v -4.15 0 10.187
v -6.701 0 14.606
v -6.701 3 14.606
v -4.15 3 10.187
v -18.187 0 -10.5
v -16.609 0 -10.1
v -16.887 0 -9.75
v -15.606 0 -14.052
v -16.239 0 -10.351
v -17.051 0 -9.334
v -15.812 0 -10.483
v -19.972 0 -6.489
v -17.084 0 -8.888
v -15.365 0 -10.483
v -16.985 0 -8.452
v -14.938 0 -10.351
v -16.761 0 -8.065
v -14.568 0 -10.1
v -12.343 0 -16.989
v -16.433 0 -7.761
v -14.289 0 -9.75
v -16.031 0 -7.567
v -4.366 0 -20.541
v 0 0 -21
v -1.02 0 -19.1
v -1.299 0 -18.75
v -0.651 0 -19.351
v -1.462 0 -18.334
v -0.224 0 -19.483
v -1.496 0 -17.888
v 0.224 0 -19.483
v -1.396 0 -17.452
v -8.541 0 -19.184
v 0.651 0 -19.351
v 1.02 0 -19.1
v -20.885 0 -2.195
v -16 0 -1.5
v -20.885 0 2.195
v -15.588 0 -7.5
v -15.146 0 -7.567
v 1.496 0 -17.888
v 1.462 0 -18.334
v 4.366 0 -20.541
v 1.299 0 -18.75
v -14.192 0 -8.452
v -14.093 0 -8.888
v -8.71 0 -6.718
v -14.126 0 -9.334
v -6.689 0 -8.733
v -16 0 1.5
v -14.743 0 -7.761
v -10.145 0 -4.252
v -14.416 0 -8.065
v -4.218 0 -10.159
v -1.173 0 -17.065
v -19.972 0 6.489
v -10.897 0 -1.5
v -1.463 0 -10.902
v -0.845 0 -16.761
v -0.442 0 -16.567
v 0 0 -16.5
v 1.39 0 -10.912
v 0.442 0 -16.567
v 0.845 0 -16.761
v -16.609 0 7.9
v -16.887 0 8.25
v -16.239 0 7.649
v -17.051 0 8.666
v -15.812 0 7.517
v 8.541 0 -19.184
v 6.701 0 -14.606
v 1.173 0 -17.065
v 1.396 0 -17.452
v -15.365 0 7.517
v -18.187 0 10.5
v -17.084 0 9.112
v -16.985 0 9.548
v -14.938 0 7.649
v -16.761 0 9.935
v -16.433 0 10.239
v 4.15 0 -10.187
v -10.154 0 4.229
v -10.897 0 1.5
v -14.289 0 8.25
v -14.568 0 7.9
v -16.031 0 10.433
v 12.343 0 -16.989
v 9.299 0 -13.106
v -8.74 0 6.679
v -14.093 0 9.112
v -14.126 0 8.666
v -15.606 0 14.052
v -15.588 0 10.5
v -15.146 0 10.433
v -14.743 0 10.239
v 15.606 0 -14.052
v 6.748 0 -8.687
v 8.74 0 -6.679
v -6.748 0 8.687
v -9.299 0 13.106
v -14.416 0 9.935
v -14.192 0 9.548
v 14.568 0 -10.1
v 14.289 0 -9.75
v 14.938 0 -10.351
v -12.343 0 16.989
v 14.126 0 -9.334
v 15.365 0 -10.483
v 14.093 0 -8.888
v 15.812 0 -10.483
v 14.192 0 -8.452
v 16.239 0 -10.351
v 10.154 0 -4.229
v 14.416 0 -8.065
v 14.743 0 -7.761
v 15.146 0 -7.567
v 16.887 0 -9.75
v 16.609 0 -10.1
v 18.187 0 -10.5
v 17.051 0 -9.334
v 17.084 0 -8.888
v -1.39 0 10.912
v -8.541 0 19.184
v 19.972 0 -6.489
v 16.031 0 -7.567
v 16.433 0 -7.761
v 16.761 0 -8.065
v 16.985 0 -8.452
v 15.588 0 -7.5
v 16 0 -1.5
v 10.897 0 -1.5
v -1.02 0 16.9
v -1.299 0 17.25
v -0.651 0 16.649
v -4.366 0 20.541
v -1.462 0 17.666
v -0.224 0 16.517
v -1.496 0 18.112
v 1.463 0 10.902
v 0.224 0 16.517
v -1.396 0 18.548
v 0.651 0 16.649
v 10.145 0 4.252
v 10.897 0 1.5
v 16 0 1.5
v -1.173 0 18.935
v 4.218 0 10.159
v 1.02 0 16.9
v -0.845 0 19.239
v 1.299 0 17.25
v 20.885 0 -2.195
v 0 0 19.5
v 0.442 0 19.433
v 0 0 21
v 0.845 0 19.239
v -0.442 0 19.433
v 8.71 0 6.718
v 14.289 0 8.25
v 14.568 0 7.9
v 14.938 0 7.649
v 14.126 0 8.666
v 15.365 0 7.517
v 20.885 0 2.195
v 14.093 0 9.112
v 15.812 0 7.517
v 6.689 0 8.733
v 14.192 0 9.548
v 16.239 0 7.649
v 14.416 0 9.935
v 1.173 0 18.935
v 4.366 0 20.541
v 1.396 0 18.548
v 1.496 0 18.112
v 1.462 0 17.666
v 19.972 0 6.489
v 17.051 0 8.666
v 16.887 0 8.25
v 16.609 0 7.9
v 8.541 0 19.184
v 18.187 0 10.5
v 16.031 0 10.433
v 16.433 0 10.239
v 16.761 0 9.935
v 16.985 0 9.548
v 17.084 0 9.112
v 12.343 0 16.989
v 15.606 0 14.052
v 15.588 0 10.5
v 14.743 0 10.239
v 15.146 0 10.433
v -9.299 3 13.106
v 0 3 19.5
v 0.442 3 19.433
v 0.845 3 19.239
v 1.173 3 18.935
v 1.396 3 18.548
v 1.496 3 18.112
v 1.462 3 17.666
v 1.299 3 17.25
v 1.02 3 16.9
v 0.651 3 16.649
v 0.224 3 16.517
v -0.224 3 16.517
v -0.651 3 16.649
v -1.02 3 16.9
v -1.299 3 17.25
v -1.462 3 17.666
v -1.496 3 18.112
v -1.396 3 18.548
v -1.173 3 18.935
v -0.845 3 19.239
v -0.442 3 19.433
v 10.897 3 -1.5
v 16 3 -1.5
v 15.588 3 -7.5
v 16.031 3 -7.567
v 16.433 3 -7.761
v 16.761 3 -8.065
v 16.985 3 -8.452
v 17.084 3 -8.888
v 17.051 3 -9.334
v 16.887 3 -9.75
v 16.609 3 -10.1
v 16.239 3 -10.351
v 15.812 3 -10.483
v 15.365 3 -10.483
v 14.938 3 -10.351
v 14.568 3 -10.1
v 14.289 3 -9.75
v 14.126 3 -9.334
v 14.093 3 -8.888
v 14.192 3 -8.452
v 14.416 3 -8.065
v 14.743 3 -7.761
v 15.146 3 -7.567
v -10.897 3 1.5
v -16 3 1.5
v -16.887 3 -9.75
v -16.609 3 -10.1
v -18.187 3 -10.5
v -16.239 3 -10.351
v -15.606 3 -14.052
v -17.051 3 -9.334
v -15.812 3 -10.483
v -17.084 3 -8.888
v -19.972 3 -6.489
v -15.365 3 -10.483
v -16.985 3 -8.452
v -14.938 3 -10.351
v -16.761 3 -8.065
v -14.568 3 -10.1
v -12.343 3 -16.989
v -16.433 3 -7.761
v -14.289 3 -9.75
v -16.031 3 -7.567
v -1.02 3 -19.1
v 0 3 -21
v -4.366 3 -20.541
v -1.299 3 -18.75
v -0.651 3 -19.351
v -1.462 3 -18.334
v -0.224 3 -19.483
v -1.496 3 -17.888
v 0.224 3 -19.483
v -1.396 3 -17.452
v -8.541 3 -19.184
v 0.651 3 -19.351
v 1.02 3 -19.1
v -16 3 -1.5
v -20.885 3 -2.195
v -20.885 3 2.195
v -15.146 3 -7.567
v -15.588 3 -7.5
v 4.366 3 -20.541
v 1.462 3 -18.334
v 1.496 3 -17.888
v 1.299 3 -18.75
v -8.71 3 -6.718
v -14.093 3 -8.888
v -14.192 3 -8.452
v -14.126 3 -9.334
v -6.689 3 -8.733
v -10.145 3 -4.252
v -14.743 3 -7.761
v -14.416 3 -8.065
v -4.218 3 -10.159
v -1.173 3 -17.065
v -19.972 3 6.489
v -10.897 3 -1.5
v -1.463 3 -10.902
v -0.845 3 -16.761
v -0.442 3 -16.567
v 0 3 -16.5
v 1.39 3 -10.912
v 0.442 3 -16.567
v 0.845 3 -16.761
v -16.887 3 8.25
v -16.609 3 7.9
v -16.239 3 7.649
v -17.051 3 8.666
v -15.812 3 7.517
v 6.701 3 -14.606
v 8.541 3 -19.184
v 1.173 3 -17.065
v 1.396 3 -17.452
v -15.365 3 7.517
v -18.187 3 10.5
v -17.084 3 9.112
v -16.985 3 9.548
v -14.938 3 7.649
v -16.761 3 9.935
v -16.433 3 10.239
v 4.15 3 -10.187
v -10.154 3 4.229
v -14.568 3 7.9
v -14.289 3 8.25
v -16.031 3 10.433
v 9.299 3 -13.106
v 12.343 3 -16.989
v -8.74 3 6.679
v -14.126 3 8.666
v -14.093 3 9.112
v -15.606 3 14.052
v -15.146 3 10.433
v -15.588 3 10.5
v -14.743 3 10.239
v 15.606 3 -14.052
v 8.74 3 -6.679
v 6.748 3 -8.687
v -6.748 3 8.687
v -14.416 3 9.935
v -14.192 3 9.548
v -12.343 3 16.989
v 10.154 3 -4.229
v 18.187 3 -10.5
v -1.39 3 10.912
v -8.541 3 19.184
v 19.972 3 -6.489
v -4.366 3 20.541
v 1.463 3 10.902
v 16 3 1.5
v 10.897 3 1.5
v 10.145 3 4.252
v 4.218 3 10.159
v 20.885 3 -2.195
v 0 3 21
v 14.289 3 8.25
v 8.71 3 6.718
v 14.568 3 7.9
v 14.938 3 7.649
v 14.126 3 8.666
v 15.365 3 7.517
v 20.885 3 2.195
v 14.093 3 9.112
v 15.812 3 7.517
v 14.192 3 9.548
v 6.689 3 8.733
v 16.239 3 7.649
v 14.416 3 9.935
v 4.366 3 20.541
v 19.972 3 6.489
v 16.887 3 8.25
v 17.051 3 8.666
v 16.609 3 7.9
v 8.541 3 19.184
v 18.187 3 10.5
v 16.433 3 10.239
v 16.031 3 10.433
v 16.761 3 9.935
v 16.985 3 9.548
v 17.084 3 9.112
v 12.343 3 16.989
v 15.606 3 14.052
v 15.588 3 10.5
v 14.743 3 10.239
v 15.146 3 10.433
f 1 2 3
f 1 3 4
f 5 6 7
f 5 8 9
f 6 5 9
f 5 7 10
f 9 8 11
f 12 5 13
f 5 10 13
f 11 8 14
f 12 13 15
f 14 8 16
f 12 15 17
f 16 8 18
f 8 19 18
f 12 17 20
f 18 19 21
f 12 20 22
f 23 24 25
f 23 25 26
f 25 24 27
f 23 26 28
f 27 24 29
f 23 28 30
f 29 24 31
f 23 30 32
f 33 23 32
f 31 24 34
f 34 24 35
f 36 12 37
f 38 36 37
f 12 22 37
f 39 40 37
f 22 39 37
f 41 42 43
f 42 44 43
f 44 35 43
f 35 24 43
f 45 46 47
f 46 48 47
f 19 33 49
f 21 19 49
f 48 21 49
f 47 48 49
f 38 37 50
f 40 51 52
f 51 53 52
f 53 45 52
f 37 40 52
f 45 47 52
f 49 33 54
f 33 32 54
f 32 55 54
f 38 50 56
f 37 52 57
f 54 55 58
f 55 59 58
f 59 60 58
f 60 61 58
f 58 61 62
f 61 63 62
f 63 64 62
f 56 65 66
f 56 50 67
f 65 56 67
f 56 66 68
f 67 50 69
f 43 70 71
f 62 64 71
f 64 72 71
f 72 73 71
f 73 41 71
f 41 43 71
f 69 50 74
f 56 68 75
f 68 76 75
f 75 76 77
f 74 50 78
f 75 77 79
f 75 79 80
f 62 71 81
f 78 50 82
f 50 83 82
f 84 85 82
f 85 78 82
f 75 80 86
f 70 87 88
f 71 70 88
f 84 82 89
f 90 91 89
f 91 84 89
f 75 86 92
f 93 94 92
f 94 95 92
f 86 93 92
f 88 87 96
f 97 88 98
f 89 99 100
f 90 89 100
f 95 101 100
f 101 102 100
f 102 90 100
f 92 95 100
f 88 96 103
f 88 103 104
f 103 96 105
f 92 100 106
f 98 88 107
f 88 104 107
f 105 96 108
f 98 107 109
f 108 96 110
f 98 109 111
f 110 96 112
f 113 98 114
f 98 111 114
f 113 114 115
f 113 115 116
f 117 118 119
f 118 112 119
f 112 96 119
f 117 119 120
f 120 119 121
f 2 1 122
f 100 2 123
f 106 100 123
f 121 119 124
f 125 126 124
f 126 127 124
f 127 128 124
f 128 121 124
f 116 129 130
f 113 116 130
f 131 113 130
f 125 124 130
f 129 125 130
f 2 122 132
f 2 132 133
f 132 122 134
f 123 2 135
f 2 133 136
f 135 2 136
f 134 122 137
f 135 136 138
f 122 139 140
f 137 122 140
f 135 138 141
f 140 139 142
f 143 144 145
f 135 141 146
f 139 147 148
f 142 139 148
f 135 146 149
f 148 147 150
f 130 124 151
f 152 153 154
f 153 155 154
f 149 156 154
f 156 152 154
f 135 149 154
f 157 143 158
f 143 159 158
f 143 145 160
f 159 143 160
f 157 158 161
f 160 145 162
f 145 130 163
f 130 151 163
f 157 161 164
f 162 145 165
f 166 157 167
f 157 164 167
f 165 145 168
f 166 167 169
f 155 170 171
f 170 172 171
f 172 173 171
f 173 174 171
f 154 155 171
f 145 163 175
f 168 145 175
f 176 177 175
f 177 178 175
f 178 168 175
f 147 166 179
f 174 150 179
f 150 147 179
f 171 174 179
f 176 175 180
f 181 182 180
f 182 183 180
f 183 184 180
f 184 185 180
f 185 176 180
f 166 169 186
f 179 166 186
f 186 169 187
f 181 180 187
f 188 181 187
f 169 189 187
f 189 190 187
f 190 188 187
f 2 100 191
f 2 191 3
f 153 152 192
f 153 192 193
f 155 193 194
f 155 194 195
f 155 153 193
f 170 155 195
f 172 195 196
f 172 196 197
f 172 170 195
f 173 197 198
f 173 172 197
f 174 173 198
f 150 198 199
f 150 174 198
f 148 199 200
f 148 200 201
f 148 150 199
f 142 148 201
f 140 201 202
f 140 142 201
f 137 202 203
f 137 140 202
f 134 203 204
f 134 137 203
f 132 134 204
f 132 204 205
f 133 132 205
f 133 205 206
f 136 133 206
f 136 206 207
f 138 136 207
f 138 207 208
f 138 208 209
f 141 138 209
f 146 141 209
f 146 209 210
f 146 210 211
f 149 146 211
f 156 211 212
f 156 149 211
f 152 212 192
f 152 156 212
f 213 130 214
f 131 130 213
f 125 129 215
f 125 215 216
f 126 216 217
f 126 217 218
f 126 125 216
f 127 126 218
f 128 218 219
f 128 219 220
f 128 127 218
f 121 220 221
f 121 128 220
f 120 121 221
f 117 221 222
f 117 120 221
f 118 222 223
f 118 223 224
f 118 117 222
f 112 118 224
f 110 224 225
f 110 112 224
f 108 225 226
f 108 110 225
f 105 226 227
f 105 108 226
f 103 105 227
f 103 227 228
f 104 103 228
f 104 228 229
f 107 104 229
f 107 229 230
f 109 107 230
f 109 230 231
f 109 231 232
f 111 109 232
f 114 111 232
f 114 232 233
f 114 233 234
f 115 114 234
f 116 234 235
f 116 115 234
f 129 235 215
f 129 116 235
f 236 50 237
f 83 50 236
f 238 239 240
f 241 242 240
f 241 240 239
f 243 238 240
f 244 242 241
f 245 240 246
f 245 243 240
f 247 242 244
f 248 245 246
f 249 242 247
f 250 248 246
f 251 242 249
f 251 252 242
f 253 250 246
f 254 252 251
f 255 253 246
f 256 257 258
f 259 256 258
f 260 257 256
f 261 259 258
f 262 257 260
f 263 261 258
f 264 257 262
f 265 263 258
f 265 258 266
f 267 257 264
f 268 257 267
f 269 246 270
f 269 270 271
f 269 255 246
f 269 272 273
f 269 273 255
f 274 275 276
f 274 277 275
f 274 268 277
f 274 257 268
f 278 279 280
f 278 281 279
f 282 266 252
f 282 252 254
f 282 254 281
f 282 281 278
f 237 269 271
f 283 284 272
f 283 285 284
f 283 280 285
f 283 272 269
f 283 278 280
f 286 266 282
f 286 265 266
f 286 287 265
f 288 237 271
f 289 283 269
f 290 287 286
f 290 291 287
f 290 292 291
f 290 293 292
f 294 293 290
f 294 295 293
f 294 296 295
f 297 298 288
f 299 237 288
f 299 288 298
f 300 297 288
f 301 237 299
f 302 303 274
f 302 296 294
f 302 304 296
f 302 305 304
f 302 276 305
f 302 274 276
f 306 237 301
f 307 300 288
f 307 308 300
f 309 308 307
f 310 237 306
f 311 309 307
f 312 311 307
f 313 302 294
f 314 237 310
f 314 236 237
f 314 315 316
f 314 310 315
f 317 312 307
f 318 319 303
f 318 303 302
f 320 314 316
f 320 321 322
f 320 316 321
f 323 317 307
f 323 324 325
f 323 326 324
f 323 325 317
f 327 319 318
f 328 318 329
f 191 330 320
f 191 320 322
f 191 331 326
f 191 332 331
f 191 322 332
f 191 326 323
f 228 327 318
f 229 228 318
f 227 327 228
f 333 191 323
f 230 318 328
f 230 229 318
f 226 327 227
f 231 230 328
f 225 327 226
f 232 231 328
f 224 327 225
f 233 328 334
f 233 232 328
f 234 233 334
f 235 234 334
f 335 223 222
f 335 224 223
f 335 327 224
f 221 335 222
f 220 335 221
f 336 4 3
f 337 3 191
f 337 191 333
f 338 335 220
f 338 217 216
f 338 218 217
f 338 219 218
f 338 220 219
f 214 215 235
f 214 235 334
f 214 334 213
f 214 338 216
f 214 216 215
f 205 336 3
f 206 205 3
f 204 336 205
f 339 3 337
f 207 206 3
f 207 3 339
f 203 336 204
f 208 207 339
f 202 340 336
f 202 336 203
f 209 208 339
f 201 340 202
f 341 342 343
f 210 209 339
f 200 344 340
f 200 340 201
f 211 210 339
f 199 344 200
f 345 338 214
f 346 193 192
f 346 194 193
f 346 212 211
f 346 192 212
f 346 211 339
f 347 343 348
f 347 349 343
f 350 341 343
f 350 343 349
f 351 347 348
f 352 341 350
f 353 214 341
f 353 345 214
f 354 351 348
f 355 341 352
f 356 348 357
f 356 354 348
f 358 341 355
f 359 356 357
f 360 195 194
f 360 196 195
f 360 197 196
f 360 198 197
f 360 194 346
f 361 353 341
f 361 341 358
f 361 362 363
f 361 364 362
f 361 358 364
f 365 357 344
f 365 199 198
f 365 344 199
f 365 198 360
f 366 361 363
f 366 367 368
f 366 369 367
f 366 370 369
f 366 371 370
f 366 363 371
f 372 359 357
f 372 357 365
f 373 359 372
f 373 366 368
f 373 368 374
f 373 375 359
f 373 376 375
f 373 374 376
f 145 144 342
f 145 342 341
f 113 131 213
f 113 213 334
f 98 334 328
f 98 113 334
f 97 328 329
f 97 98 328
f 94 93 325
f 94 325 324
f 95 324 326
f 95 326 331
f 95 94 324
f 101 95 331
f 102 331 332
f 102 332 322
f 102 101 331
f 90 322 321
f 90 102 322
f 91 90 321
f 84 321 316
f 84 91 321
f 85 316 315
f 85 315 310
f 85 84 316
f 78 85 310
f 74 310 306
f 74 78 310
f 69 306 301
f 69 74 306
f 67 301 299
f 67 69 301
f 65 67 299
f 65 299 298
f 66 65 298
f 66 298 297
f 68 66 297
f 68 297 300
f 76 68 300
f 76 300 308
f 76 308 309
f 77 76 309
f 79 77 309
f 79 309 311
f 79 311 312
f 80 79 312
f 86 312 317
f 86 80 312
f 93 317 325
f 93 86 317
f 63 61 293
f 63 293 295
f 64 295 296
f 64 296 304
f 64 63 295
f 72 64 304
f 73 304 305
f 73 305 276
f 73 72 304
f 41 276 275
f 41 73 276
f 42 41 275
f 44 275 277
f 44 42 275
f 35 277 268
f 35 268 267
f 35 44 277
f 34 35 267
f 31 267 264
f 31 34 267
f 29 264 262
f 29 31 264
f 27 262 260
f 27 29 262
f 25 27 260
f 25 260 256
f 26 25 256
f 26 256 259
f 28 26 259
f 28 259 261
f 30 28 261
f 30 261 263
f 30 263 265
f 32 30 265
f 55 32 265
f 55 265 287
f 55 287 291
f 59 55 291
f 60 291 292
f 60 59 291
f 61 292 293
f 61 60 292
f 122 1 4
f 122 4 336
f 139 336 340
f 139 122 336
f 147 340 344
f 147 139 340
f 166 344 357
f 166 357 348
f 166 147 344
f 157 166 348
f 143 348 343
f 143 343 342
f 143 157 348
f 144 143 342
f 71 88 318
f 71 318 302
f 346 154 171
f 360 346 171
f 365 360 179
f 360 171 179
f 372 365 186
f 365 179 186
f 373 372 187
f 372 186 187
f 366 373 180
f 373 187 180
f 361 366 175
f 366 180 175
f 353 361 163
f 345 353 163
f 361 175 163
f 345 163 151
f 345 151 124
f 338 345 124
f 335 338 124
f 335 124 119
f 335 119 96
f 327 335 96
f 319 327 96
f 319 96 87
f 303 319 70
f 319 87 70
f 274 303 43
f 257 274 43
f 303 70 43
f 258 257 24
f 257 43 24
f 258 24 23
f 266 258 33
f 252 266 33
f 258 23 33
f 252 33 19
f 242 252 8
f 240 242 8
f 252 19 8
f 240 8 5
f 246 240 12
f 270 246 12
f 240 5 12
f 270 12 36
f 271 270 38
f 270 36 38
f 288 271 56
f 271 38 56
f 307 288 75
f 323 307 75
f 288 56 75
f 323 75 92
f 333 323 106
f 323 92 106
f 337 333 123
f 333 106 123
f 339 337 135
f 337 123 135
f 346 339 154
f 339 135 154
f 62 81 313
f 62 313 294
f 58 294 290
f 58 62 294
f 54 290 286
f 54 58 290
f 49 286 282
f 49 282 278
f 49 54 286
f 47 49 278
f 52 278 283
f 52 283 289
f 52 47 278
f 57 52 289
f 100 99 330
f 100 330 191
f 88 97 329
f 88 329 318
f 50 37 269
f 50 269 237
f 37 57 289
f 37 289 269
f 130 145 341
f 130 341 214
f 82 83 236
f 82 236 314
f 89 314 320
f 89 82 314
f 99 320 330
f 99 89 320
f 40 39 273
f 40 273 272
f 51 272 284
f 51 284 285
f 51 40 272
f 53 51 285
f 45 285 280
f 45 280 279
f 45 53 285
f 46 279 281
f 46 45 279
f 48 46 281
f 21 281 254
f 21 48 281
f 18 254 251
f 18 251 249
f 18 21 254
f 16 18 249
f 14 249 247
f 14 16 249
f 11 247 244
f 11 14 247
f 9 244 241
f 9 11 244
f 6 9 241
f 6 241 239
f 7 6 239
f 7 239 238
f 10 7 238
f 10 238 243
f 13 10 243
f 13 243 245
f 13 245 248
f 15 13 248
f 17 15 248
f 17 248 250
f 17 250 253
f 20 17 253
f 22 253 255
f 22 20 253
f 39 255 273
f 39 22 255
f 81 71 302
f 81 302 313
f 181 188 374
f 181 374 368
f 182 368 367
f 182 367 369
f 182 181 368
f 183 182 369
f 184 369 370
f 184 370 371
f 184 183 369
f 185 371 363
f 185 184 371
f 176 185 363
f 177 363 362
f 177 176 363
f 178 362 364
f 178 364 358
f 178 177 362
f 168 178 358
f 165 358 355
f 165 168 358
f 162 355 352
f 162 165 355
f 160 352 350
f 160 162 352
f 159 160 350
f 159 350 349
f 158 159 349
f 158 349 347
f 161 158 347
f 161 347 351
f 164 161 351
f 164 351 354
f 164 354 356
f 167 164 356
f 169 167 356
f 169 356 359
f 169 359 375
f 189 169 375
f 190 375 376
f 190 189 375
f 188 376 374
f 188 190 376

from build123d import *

# Parameters (mm, degrees)
SKETCH1_R           = 21
SKETCH1_R_2         = 1.5
BOSS_EXTRUDE2_DEPTH = 3


with BuildPart() as part:
    # Sketch1 → Boss-Extrude2 (new body)
    with BuildSketch(Plane(origin=(0, 0, 0), x_dir=(1, 0, 0), z_dir=(0, 1, 0))):
        with Locations(Location((0, 0, 0), (0, 0, 270))):
            Circle(SKETCH1_R)
        with Locations(Location((-15.588457268, 9, 0), (0, 0, 270))):
            Circle(SKETCH1_R_2, mode=Mode.SUBTRACT)
        with Locations(Location((-15.588457268, -9, 0), (0, 0, 270))):
            Circle(SKETCH1_R_2, mode=Mode.SUBTRACT)
        with Locations(Location((0, -18, 0), (0, 0, 270))):
            Circle(SKETCH1_R_2, mode=Mode.SUBTRACT)
        with Locations(Location((15.588457268, -9, 0), (0, 0, 270))):
            Circle(SKETCH1_R_2, mode=Mode.SUBTRACT)
        with Locations(Location((15.588457268, 9, 0), (0, 0, 270))):
            Circle(SKETCH1_R_2, mode=Mode.SUBTRACT)
        with Locations(Location((0, 18, 0), (0, 0, 270))):
            Circle(SKETCH1_R_2, mode=Mode.SUBTRACT)
        with BuildLine():
            ThreePointArc((4.149585574, 10.187293044), (-5.5, 9.526279442), (-10.897247359, 1.5))
            Line((-10.897247359, 1.5), (-16, 1.5))
            Line((-16, 1.5), (-16, -1.5))
            Line((-16, -1.5), (-10.897247359, -1.5))
            ThreePointArc((-10.897247359, -1.5), (-9.526279442, -5.5), (-6.747661785, -8.687293044))
            Line((-6.747661785, -8.687293044), (-9.299038106, -13.106406461))
            Line((-9.299038106, -13.106406461), (-6.700961894, -14.606406461))
            Line((-6.700961894, -14.606406461), (-4.149585574, -10.187293044))
            ThreePointArc((-4.149585574, -10.187293044), (5.5, -9.526279442), (10.897247359, -1.5))
            Line((10.897247359, -1.5), (16, -1.5))
            Line((16, -1.5), (16, 1.5))
            Line((16, 1.5), (10.897247359, 1.5))
            ThreePointArc((10.897247359, 1.5), (9.526279442, 5.5), (6.747661785, 8.687293044))
            Line((6.747661785, 8.687293044), (9.299038106, 13.106406461))
            Line((9.299038106, 13.106406461), (6.700961894, 14.606406461))
            Line((6.700961894, 14.606406461), (4.149585574, 10.187293044))
        make_face(mode=Mode.SUBTRACT)
    extrude(amount=BOSS_EXTRUDE2_DEPTH)


solid = part.part
